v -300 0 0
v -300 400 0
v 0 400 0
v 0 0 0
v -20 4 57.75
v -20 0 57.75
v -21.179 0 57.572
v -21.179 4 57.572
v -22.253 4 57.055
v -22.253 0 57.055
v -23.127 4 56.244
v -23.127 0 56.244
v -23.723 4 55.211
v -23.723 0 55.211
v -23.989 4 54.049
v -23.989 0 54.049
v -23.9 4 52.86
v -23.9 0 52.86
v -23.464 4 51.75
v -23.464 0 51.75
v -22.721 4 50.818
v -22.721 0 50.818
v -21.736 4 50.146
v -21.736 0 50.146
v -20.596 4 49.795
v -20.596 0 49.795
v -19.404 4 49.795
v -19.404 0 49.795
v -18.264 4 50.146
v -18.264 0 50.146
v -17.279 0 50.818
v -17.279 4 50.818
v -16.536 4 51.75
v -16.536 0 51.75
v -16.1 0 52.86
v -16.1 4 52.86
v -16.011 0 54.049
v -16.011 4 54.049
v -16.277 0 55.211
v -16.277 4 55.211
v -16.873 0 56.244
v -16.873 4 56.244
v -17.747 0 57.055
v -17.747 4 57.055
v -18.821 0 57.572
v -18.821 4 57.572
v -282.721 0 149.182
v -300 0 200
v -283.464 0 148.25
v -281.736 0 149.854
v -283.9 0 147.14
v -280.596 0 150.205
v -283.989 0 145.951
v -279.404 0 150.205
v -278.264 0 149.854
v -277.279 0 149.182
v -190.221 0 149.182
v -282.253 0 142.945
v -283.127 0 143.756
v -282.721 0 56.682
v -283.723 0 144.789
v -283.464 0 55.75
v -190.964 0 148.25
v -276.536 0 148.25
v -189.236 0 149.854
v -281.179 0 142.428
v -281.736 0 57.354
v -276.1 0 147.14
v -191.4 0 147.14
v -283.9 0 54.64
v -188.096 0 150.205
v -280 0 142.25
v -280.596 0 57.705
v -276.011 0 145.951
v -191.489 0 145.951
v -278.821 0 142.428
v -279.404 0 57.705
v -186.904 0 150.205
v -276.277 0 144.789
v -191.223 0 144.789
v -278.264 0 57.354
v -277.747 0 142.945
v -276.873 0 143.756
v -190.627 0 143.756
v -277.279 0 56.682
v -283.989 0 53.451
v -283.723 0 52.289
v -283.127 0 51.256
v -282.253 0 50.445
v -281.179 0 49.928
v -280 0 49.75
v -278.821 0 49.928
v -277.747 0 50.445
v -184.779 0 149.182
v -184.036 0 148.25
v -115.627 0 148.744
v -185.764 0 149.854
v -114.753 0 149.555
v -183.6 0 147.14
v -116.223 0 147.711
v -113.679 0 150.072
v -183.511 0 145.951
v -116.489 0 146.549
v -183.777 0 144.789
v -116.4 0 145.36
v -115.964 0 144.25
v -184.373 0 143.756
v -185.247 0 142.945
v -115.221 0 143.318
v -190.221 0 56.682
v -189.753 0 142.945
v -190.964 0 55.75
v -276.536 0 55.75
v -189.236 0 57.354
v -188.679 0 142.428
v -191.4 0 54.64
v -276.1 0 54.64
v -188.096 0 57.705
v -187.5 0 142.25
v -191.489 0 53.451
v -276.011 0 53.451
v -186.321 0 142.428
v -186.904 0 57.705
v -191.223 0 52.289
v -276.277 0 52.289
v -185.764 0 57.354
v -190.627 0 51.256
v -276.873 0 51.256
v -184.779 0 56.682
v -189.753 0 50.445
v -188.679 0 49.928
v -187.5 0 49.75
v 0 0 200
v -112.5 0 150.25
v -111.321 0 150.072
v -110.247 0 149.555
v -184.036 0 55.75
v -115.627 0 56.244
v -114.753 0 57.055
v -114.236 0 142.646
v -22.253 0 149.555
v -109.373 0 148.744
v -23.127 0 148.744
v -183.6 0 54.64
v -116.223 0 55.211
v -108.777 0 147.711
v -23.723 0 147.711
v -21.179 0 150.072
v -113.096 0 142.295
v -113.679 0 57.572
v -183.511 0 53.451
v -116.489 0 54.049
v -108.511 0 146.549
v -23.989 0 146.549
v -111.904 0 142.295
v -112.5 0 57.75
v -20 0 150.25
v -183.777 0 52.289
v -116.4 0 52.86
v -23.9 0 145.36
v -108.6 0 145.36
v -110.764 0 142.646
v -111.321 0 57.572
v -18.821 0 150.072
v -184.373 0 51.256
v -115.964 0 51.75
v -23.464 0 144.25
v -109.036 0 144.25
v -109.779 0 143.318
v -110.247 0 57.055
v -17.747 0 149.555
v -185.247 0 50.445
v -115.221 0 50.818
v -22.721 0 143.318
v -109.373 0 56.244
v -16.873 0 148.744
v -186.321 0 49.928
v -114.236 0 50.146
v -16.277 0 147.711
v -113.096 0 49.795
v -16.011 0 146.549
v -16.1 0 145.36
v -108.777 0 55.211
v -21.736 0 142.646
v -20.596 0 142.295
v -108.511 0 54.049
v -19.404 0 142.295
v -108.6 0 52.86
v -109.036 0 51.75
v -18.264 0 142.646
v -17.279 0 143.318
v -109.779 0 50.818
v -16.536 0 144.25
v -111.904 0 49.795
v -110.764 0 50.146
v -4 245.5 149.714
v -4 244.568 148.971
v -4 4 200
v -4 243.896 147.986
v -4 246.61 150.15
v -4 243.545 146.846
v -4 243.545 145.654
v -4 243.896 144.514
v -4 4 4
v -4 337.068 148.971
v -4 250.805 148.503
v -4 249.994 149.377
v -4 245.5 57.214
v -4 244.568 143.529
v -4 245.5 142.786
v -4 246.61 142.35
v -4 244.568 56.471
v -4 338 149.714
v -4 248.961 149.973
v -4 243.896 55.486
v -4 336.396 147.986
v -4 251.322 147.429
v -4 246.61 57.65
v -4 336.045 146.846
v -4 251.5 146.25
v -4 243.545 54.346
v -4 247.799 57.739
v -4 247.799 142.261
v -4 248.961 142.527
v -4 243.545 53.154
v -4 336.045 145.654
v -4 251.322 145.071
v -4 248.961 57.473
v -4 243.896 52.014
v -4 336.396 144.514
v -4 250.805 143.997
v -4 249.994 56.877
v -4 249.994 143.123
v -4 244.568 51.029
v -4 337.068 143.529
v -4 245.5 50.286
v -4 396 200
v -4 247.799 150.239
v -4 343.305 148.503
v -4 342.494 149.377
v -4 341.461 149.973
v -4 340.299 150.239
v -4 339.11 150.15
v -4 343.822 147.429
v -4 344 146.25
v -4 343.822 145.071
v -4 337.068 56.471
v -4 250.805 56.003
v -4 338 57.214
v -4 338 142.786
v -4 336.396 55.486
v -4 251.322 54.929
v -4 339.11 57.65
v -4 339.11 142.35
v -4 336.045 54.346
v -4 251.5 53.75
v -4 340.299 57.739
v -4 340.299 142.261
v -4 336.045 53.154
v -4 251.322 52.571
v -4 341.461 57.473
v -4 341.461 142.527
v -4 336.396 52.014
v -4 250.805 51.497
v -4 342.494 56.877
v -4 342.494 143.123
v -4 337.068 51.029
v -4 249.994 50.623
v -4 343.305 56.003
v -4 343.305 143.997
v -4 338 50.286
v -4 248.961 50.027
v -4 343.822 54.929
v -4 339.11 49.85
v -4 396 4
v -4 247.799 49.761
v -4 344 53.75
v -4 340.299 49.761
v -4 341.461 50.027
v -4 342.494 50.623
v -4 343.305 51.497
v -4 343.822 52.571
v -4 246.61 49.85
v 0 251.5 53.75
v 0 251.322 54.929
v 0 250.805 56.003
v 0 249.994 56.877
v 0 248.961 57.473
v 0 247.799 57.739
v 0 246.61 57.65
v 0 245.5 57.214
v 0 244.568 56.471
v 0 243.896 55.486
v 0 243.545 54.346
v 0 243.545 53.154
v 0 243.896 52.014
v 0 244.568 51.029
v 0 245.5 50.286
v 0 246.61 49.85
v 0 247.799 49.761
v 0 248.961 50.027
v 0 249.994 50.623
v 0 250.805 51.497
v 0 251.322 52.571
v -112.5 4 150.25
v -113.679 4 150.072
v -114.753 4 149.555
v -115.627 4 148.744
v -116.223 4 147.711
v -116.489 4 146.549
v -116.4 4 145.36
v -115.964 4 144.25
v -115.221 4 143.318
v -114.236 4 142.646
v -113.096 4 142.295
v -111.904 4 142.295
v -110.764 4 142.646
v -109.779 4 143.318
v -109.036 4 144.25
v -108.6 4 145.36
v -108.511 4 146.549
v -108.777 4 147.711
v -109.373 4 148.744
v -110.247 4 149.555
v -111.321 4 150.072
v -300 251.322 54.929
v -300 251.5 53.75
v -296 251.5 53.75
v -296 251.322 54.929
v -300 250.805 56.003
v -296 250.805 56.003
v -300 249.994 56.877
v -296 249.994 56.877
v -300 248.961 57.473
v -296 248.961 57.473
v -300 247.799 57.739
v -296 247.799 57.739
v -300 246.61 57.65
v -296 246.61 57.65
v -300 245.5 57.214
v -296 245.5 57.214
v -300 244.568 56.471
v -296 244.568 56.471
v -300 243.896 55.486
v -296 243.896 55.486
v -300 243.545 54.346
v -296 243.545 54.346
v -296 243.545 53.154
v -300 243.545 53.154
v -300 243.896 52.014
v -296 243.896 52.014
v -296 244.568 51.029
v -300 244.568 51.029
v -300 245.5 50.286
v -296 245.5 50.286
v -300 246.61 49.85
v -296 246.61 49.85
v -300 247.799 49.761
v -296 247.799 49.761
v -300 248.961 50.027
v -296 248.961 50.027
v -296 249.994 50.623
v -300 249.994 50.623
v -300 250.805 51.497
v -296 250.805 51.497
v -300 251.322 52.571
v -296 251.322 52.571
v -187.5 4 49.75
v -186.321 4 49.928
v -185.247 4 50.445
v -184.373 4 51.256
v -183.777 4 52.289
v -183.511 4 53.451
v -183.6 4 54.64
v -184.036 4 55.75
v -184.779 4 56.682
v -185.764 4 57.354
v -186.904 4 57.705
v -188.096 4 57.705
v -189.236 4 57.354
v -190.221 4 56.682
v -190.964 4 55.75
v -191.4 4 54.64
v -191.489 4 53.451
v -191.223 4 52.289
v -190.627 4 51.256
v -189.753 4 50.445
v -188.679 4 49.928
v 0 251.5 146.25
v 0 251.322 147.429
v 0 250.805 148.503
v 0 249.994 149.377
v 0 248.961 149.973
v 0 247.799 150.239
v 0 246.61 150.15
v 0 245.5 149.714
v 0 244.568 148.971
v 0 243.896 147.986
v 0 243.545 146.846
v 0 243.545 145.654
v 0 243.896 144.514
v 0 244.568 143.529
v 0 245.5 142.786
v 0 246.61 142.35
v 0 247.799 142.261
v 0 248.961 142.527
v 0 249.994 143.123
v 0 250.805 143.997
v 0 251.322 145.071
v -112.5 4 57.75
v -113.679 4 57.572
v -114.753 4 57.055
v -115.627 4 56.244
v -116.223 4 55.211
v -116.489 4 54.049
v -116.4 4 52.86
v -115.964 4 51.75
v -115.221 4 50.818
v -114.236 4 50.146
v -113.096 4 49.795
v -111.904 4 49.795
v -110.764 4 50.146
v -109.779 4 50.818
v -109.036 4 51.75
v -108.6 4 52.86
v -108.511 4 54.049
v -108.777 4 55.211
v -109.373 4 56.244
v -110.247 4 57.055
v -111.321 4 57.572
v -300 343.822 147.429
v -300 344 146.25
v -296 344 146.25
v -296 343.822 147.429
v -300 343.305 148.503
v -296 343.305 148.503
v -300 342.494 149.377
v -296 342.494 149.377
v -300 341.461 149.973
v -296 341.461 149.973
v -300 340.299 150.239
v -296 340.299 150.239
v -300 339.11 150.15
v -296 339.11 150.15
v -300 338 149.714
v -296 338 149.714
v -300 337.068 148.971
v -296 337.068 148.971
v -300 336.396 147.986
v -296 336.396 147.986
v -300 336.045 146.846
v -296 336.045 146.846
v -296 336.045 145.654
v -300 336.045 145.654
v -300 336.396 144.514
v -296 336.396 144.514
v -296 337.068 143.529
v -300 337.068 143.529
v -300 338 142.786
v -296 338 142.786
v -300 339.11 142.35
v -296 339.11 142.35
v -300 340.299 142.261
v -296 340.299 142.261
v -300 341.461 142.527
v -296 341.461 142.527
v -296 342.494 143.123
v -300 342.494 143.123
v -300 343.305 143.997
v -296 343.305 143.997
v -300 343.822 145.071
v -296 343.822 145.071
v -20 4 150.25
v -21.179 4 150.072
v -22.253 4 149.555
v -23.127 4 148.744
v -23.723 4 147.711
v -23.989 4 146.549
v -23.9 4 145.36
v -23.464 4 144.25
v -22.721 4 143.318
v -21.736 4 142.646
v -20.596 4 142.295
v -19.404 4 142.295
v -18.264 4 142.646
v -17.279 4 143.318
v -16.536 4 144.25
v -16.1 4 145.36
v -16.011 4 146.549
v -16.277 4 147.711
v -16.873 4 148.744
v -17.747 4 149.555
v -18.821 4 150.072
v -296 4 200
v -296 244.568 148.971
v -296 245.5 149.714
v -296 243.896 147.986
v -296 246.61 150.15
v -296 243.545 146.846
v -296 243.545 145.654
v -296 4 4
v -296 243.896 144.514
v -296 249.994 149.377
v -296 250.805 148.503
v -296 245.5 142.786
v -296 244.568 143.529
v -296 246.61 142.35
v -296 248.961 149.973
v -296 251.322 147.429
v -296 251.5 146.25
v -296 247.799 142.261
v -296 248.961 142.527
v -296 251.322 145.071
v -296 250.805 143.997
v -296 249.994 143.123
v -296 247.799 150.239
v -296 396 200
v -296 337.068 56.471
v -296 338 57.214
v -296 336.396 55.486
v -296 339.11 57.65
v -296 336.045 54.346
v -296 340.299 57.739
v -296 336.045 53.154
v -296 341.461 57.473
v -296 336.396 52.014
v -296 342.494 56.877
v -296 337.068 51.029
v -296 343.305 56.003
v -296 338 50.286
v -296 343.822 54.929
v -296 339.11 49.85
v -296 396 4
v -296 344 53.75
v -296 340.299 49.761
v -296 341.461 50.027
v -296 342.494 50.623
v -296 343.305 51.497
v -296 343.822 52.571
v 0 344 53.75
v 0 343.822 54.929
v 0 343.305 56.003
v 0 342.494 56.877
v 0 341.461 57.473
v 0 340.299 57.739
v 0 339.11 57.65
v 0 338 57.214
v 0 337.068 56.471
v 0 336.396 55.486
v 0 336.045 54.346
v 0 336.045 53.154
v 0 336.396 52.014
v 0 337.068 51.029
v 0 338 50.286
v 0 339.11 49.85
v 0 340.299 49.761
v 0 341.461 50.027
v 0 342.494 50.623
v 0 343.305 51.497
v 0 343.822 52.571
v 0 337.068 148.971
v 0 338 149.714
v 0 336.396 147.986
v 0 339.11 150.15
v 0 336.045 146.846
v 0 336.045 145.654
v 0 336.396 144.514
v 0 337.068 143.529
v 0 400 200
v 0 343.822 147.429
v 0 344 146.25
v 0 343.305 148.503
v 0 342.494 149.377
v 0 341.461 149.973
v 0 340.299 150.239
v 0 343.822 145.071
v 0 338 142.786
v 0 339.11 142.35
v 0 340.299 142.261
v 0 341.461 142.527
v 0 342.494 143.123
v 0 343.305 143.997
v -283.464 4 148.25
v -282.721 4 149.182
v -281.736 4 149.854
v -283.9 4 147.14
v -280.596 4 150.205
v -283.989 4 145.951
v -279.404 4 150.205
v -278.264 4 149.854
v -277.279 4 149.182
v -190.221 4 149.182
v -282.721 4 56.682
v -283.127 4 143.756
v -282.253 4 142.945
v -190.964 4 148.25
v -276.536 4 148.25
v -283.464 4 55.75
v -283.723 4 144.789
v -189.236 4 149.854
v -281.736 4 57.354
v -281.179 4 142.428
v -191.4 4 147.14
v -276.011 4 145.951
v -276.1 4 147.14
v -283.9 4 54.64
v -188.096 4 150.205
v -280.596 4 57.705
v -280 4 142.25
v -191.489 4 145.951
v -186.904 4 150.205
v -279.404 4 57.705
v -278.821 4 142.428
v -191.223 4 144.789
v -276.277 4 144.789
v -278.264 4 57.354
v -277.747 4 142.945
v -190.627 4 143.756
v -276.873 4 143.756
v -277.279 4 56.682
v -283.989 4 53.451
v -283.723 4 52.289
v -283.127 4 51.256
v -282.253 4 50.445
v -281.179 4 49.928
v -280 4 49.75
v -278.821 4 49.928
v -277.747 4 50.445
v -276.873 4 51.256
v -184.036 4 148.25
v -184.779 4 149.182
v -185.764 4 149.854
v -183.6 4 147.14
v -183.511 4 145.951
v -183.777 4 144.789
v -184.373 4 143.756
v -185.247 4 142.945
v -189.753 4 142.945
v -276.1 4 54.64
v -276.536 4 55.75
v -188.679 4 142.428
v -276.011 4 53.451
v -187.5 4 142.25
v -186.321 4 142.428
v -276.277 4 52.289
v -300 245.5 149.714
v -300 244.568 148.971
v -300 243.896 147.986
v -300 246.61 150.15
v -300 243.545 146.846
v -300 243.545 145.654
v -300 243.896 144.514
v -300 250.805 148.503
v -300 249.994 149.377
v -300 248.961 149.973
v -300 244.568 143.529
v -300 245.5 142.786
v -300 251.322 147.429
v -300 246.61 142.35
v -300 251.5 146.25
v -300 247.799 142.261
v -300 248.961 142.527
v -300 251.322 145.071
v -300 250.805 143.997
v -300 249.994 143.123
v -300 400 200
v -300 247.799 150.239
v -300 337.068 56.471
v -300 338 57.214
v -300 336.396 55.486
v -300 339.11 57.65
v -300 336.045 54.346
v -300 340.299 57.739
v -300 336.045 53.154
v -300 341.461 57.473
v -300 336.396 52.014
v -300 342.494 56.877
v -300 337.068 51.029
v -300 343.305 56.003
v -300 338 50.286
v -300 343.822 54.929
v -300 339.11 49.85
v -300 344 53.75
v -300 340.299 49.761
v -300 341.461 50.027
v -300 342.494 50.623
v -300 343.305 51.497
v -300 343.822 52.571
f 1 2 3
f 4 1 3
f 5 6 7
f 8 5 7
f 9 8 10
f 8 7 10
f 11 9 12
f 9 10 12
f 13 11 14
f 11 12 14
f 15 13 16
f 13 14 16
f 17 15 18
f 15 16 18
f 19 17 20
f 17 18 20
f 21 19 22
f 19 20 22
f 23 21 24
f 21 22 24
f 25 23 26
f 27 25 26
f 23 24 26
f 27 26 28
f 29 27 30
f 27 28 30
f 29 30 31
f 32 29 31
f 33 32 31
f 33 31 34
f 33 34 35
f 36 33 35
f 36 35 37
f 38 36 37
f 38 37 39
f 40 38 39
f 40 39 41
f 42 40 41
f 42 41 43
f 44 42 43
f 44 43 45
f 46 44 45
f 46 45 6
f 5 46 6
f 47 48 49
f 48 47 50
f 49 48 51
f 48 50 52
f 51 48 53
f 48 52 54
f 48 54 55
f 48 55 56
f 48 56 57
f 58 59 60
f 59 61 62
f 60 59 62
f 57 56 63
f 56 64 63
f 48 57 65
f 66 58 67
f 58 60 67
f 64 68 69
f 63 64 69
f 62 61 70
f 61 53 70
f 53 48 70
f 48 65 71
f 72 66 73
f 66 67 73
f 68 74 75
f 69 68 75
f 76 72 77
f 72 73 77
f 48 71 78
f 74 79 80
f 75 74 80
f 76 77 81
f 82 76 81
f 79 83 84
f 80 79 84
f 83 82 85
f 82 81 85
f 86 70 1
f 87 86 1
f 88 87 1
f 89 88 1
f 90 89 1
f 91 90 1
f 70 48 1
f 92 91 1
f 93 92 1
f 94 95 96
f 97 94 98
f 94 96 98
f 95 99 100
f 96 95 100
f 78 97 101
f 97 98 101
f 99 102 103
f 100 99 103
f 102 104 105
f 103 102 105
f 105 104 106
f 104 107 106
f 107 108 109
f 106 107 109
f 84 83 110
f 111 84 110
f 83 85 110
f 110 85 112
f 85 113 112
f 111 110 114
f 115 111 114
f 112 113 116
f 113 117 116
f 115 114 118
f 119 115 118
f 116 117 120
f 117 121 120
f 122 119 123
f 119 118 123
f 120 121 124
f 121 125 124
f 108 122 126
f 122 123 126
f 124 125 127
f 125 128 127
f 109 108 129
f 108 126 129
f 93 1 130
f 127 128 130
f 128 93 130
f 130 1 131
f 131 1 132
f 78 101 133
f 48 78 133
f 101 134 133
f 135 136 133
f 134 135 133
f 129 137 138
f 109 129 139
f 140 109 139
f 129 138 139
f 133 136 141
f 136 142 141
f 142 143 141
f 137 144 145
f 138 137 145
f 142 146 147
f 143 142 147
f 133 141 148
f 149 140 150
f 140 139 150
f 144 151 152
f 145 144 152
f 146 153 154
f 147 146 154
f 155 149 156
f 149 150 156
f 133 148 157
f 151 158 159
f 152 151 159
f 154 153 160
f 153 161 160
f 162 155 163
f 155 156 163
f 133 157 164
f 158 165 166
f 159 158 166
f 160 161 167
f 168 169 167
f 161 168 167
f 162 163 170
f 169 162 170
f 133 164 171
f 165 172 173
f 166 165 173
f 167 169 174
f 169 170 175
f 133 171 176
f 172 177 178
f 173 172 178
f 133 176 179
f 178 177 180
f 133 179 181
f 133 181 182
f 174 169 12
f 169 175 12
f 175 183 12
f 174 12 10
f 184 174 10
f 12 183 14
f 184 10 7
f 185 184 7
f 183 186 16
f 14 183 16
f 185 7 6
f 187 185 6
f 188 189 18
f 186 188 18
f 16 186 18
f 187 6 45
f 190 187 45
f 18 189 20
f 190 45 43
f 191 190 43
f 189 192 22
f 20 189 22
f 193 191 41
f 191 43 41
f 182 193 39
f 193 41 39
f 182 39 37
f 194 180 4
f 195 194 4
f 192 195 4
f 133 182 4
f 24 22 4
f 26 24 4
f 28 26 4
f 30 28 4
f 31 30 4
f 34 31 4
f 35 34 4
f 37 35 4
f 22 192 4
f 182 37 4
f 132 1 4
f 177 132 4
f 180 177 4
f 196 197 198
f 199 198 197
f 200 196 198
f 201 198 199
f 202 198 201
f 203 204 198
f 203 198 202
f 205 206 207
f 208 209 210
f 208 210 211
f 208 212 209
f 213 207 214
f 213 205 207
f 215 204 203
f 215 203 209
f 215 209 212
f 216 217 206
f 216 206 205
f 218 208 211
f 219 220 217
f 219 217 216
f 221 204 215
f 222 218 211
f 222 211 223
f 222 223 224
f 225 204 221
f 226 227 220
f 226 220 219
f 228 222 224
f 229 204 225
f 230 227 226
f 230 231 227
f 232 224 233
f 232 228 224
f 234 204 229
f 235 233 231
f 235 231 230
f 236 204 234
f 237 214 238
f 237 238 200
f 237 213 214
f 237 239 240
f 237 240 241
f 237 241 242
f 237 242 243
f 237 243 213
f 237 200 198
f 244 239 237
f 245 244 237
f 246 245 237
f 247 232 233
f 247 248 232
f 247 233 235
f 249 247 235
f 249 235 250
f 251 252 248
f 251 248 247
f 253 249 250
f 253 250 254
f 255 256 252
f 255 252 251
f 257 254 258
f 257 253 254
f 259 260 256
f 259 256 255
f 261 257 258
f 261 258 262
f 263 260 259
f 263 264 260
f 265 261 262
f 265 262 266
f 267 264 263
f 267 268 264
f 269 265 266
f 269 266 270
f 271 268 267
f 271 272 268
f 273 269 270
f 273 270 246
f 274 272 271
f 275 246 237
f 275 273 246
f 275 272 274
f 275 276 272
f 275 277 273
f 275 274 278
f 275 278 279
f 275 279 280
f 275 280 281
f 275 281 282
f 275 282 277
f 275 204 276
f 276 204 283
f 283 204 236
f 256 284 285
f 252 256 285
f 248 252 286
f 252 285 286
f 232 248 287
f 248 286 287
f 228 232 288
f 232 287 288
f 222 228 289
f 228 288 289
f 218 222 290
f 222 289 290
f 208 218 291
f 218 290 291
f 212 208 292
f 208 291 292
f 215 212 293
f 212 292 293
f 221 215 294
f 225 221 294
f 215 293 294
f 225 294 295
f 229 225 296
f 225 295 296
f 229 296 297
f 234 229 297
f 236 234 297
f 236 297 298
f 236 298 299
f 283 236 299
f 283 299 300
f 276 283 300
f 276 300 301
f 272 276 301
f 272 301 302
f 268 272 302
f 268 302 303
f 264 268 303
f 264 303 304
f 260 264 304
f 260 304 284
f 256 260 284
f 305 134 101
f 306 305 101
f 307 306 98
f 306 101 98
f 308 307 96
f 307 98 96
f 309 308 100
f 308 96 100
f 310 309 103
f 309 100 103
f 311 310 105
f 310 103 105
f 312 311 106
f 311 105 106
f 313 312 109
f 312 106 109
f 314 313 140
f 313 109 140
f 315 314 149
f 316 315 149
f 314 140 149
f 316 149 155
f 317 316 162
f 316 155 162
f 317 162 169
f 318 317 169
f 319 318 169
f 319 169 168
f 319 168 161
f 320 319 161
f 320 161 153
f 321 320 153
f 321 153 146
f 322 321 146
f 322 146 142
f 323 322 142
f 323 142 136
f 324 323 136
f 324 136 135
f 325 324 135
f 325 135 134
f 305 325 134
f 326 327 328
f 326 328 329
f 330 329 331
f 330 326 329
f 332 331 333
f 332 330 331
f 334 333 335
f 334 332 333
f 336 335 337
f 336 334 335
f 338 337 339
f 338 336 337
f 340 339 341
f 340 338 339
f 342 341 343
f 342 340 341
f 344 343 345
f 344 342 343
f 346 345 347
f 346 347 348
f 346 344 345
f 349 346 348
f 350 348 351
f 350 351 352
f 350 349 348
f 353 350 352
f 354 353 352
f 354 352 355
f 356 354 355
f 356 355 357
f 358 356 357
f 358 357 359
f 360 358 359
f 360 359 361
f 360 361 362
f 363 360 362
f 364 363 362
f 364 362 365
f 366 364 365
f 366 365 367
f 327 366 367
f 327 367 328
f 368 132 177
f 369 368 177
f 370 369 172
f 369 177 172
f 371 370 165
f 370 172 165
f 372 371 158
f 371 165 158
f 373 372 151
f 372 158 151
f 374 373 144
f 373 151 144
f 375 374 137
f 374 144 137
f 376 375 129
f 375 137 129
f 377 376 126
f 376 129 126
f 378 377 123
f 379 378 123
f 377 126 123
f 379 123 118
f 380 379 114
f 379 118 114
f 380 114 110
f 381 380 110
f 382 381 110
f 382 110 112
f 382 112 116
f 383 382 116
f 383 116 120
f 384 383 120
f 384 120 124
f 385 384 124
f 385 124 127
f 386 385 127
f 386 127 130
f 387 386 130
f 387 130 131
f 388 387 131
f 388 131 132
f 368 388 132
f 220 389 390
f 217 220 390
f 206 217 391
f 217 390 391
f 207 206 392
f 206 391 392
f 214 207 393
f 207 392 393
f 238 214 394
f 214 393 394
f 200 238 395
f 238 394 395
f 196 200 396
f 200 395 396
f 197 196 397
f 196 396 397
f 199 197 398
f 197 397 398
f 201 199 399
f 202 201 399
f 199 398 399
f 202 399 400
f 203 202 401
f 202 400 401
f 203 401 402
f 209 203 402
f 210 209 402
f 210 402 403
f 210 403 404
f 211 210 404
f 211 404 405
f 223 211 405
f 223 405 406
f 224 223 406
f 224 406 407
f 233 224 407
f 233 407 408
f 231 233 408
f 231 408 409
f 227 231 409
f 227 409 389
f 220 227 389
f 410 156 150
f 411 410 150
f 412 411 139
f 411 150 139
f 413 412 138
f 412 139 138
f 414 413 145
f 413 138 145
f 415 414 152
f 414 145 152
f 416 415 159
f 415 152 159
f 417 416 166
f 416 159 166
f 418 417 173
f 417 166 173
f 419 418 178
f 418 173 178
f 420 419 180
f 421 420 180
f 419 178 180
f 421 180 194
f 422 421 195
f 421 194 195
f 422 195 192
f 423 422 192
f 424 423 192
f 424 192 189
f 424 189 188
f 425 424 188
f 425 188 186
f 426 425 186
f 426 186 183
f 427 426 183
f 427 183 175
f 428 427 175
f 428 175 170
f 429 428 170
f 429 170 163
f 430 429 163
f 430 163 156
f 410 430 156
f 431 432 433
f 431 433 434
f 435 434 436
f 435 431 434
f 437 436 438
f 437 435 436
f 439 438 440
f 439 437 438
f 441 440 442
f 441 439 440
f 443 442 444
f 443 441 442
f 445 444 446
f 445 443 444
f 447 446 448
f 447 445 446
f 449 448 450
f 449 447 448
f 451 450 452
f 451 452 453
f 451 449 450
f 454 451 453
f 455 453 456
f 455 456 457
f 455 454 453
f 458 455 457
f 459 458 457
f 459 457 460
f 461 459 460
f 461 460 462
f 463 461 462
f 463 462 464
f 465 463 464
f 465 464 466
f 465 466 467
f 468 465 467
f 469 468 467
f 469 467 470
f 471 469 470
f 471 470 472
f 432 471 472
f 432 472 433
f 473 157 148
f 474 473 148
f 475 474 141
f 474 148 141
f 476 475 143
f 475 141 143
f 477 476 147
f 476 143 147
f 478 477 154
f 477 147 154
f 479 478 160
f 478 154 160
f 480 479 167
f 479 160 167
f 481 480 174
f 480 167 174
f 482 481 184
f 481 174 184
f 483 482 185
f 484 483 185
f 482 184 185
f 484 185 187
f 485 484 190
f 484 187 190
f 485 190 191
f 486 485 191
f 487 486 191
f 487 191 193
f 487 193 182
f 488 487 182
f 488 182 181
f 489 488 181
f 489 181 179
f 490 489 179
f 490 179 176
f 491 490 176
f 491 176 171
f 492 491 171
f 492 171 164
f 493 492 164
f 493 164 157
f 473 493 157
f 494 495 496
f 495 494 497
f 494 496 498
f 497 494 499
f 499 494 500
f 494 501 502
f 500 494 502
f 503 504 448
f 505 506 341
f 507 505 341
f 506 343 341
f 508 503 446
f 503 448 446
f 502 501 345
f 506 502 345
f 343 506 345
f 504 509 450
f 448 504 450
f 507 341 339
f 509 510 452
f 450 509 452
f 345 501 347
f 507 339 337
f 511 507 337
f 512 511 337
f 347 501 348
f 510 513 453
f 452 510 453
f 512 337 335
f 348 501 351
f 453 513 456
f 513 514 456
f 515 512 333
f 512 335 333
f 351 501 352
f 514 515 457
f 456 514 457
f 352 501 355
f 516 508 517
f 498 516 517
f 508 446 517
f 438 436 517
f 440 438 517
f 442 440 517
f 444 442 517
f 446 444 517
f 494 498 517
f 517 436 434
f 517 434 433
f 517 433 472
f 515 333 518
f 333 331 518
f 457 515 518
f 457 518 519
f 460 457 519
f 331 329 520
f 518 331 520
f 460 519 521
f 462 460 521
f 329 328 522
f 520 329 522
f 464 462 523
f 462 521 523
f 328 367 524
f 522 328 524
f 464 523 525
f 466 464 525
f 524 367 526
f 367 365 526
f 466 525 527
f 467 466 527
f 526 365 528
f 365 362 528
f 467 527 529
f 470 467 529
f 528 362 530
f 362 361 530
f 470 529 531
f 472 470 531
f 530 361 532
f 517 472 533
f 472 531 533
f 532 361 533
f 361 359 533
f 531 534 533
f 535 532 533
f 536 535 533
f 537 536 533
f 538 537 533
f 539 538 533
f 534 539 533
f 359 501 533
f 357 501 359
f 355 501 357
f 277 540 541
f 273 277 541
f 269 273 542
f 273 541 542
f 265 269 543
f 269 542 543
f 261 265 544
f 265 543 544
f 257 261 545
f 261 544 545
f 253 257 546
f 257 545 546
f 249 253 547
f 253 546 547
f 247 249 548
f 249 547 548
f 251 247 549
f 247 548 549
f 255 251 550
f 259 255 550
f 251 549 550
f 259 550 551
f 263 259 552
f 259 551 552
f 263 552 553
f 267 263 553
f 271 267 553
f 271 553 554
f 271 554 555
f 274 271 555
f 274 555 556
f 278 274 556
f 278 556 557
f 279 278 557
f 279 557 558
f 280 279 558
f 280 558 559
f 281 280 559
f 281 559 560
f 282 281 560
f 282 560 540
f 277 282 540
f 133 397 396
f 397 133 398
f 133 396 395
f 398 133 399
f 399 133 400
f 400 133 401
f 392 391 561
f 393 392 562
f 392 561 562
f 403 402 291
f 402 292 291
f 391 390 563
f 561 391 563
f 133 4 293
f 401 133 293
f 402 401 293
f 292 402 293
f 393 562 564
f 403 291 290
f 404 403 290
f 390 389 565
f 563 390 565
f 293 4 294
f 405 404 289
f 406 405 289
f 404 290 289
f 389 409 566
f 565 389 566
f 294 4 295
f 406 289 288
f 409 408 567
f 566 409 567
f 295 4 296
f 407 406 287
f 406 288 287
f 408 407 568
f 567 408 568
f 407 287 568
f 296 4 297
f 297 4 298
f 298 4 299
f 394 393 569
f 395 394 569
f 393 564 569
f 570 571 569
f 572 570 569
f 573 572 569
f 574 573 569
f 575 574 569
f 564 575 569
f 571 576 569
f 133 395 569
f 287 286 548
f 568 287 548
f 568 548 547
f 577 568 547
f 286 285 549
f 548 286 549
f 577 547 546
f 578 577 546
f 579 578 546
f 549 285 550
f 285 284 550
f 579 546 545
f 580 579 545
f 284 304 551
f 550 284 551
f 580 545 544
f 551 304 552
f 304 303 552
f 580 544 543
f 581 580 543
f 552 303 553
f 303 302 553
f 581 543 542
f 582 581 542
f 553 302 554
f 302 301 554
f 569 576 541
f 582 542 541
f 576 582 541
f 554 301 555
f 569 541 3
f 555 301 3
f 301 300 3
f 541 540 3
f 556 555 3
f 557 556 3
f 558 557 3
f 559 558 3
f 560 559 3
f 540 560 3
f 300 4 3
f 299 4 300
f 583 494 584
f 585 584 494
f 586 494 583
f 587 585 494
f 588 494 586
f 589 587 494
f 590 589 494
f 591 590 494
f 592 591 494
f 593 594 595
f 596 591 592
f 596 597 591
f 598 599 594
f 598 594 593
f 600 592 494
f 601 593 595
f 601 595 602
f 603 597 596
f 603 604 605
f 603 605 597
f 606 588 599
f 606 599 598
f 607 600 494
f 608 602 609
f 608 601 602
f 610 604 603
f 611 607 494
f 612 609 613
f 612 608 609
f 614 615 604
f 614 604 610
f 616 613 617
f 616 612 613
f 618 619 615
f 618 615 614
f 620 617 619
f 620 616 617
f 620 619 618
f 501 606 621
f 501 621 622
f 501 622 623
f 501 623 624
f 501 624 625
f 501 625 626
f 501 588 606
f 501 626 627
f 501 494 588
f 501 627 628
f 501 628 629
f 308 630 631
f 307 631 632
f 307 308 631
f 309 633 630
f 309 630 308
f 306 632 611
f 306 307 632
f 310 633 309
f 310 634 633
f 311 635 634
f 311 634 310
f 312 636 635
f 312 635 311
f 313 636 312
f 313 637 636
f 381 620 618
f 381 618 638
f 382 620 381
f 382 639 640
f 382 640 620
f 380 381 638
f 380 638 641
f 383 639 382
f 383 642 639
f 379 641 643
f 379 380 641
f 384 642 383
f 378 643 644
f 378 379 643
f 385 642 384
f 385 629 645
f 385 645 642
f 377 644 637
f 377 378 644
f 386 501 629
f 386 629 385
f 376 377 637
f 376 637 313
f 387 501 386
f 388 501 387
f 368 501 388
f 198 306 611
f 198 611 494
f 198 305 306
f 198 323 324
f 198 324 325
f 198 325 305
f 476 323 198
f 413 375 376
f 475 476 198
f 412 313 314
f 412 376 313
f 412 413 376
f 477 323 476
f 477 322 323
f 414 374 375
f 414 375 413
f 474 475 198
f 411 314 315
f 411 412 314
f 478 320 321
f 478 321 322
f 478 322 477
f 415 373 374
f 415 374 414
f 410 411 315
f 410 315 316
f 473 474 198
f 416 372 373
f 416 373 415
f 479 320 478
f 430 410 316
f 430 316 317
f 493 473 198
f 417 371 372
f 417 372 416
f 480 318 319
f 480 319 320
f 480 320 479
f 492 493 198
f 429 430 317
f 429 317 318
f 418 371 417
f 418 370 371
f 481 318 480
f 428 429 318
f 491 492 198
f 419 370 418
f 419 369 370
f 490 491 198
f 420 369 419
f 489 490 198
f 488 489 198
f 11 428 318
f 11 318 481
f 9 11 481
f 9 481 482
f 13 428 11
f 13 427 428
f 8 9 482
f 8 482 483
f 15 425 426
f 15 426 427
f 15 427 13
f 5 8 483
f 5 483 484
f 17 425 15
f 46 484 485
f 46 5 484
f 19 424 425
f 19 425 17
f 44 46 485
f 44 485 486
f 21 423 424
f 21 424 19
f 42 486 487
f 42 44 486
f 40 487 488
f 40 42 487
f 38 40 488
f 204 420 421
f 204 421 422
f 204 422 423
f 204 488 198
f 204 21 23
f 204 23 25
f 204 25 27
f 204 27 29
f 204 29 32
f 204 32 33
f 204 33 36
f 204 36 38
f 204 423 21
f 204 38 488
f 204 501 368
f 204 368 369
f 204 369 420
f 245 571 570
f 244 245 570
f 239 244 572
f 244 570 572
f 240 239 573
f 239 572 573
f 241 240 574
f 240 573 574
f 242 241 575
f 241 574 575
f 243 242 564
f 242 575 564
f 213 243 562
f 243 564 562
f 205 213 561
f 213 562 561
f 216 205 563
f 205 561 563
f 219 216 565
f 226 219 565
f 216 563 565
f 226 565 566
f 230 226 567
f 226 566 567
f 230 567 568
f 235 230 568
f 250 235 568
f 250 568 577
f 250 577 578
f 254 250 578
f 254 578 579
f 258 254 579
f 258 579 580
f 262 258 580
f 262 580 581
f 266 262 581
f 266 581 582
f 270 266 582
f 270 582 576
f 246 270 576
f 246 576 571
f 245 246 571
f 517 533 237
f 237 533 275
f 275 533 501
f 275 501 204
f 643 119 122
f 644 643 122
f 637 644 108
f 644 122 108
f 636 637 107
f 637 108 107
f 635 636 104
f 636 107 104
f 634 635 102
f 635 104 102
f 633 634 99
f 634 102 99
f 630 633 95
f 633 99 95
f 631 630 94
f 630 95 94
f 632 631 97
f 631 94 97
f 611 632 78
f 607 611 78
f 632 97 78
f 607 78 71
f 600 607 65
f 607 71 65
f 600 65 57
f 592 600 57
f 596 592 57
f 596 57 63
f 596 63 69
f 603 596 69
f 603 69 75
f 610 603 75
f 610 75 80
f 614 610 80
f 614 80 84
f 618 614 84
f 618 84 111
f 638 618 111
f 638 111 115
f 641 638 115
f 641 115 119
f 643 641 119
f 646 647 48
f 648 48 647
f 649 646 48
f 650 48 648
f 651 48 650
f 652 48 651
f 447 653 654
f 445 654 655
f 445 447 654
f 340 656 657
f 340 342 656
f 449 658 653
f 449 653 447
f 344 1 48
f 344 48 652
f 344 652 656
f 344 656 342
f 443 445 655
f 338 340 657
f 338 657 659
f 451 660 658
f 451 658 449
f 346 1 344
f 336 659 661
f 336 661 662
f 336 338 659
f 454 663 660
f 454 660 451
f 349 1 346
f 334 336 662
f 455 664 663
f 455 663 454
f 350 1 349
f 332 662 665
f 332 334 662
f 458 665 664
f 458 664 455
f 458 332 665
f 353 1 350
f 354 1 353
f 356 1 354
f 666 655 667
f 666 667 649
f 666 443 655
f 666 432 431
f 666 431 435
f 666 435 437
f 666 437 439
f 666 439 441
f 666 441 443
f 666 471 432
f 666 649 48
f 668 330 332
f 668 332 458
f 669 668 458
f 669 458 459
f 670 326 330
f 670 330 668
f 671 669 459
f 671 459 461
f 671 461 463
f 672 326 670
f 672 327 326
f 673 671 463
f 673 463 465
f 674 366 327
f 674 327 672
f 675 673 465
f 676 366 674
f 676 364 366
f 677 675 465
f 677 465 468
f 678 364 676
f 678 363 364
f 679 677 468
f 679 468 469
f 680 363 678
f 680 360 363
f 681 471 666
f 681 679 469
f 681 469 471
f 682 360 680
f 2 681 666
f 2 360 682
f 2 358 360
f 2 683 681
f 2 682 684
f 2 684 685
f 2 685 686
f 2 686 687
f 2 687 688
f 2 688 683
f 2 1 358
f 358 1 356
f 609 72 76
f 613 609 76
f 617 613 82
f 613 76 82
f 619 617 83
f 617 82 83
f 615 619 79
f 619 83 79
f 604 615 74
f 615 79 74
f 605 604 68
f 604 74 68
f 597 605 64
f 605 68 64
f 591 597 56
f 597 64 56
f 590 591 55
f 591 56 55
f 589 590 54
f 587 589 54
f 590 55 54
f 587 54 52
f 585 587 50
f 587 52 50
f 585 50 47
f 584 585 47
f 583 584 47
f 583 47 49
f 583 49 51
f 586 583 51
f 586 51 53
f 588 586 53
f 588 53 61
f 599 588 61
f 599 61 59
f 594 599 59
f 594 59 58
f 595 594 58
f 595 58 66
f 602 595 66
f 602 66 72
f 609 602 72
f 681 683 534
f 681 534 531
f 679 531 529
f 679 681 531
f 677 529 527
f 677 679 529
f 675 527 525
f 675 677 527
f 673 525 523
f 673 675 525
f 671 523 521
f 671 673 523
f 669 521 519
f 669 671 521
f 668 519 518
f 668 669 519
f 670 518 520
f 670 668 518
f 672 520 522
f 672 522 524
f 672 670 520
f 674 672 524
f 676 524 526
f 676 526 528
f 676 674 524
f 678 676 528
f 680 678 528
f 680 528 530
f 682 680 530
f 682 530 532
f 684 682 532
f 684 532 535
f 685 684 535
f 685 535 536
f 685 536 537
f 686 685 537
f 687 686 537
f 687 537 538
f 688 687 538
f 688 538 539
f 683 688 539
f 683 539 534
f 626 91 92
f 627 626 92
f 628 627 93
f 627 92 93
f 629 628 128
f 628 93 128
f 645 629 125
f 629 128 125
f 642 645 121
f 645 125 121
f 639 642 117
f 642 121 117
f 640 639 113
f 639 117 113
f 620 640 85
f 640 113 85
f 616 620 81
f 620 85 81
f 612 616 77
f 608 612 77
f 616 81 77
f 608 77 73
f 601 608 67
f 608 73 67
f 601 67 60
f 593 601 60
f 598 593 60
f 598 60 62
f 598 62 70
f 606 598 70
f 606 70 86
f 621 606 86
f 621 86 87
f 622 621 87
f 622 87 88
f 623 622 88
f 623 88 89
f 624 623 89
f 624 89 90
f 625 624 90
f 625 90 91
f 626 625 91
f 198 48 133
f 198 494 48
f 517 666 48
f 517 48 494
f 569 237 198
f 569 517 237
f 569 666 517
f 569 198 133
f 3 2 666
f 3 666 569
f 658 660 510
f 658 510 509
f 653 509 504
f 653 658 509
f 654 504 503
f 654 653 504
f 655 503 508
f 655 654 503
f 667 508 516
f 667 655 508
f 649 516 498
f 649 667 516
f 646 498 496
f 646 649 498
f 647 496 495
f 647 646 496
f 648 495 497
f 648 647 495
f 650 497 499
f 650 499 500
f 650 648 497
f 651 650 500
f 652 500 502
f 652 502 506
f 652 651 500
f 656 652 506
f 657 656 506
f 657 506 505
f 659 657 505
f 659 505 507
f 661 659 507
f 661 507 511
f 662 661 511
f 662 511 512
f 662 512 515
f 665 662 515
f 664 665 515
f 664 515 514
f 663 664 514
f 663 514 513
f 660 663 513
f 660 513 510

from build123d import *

# Parameters (mm, degrees)
IZIM1_W                     = 300
IZIM1_H                     = 400
Y_KSEKLIK_EKSTR_ZYON1_DEPTH = 200
BO_ALTMA1_T                 = -4
KES_EKSTR_ZYON1_REACH       = 540.516
IZIM2_R                     = 4
KES_EKSTR_ZYON2_REACH       = 540.516
IZIM4_R                     = 4


with BuildPart() as part:
    # Çizim1 → Yükseklik-Ekstrüzyon1 (new body)
    with BuildSketch(Plane.XY):
        with Locations((-150, 200)):
            Rectangle(IZIM1_W, IZIM1_H)
    extrude(amount=Y_KSEKLIK_EKSTR_ZYON1_DEPTH)

    # İç Boşaltma1
    bo_altma1_openings = [part.faces().sort_by_distance(p)[0] for p in [
        (-150, 200, 200),
    ]]
    offset(amount=BO_ALTMA1_T, openings=bo_altma1_openings, kind=Kind.INTERSECTION)

    # Çizim2 → Kes-Ekstrüzyon1 (cut, up to next)
    with BuildSketch(Plane(origin=(0, 0, 0), x_dir=(0, 0, -1), z_dir=(1, 0, 0)), mode=Mode.PRIVATE) as kes_ekstr_zyon1_sk1:
        with Locations(Location((-146.25, 340, 0), (0, 0, 90))):
            Circle(IZIM2_R)
    kes_ekstr_zyon1_tool1 = extrude(kes_ekstr_zyon1_sk1.sketch, amount=-KES_EKSTR_ZYON1_REACH, mode=Mode.PRIVATE) & part.part
    # Çizim2 → Kes-Ekstrüzyon1 (cut, up to next)
    with BuildSketch(Plane(origin=(0, 0, 0), x_dir=(0, 0, -1), z_dir=(1, 0, 0)), mode=Mode.PRIVATE) as kes_ekstr_zyon1_sk2:
        with Locations(Location((-53.75, 340, 0), (0, 0, 90))):
            Circle(IZIM2_R)
    kes_ekstr_zyon1_tool2 = extrude(kes_ekstr_zyon1_sk2.sketch, amount=-KES_EKSTR_ZYON1_REACH, mode=Mode.PRIVATE) & part.part
    # Çizim2 → Kes-Ekstrüzyon1 (cut, up to next)
    with BuildSketch(Plane(origin=(0, 0, 0), x_dir=(0, 0, -1), z_dir=(1, 0, 0)), mode=Mode.PRIVATE) as kes_ekstr_zyon1_sk3:
        with Locations(Location((-146.25, 247.5, 0), (0, 0, 90))):
            Circle(IZIM2_R)
    kes_ekstr_zyon1_tool3 = extrude(kes_ekstr_zyon1_sk3.sketch, amount=-KES_EKSTR_ZYON1_REACH, mode=Mode.PRIVATE) & part.part
    # Çizim2 → Kes-Ekstrüzyon1 (cut, up to next)
    with BuildSketch(Plane(origin=(0, 0, 0), x_dir=(0, 0, -1), z_dir=(1, 0, 0)), mode=Mode.PRIVATE) as kes_ekstr_zyon1_sk4:
        with Locations(Location((-53.75, 247.5, 0), (0, 0, 90))):
            Circle(IZIM2_R)
    kes_ekstr_zyon1_tool4 = extrude(kes_ekstr_zyon1_sk4.sketch, amount=-KES_EKSTR_ZYON1_REACH, mode=Mode.PRIVATE) & part.part
    kes_ekstr_zyon1_1 = kes_ekstr_zyon1_tool1.solids().sort_by_distance((0, 340, 146.25))[0]
    add(kes_ekstr_zyon1_1, mode=Mode.SUBTRACT)
    kes_ekstr_zyon1_2 = kes_ekstr_zyon1_tool2.solids().sort_by_distance((0, 340, 53.75))[0]
    add(kes_ekstr_zyon1_2, mode=Mode.SUBTRACT)
    kes_ekstr_zyon1_3 = kes_ekstr_zyon1_tool3.solids().sort_by_distance((0, 247.5, 146.25))[0]
    add(kes_ekstr_zyon1_3, mode=Mode.SUBTRACT)
    kes_ekstr_zyon1_4 = kes_ekstr_zyon1_tool4.solids().sort_by_distance((0, 247.5, 53.75))[0]
    add(kes_ekstr_zyon1_4, mode=Mode.SUBTRACT)
    kes_ekstr_zyon1 = kes_ekstr_zyon1_1 + kes_ekstr_zyon1_2 + kes_ekstr_zyon1_3 + kes_ekstr_zyon1_4  # Kes-Ekstrüzyon1 as one shape, for the pattern or mirror that repeats it

    # Aynalama1: Kes-Ekstrüzyon1 across plane
    add(kes_ekstr_zyon1.mirror(Plane(origin=(-150, 0, 0), x_dir=(0, 0, 1), z_dir=(1, 0, 0))), mode=Mode.SUBTRACT)

    # Çizim4 → Kes-Ekstrüzyon2 (cut, up to next)
    with BuildSketch(Plane.XZ, mode=Mode.PRIVATE) as kes_ekstr_zyon2_sk1:
        with Locations(Location((-280, 146.25, 0), (0, 0, 270))):
            Circle(IZIM4_R)
    kes_ekstr_zyon2_tool1 = extrude(kes_ekstr_zyon2_sk1.sketch, amount=-KES_EKSTR_ZYON2_REACH, mode=Mode.PRIVATE) & part.part
    # Çizim4 → Kes-Ekstrüzyon2 (cut, up to next)
    with BuildSketch(Plane.XZ, mode=Mode.PRIVATE) as kes_ekstr_zyon2_sk2:
        with Locations(Location((-280, 53.75, 0), (0, 0, 270))):
            Circle(IZIM4_R)
    kes_ekstr_zyon2_tool2 = extrude(kes_ekstr_zyon2_sk2.sketch, amount=-KES_EKSTR_ZYON2_REACH, mode=Mode.PRIVATE) & part.part
    # Çizim4 → Kes-Ekstrüzyon2 (cut, up to next)
    with BuildSketch(Plane.XZ, mode=Mode.PRIVATE) as kes_ekstr_zyon2_sk3:
        with Locations(Location((-187.5, 146.25, 0), (0, 0, 270))):
            Circle(IZIM4_R)
    kes_ekstr_zyon2_tool3 = extrude(kes_ekstr_zyon2_sk3.sketch, amount=-KES_EKSTR_ZYON2_REACH, mode=Mode.PRIVATE) & part.part
    # Çizim4 → Kes-Ekstrüzyon2 (cut, up to next)
    with BuildSketch(Plane.XZ, mode=Mode.PRIVATE) as kes_ekstr_zyon2_sk4:
        with Locations(Location((-187.5, 53.75, 0), (0, 0, 270))):
            Circle(IZIM4_R)
    kes_ekstr_zyon2_tool4 = extrude(kes_ekstr_zyon2_sk4.sketch, amount=-KES_EKSTR_ZYON2_REACH, mode=Mode.PRIVATE) & part.part
    # Çizim4 → Kes-Ekstrüzyon2 (cut, up to next)
    with BuildSketch(Plane.XZ, mode=Mode.PRIVATE) as kes_ekstr_zyon2_sk5:
        with Locations(Location((-20, 146.25, 0), (0, 0, 90))):
            Circle(IZIM4_R)
    kes_ekstr_zyon2_tool5 = extrude(kes_ekstr_zyon2_sk5.sketch, amount=-KES_EKSTR_ZYON2_REACH, mode=Mode.PRIVATE) & part.part
    # Çizim4 → Kes-Ekstrüzyon2 (cut, up to next)
    with BuildSketch(Plane.XZ, mode=Mode.PRIVATE) as kes_ekstr_zyon2_sk6:
        with Locations(Location((-20, 53.75, 0), (0, 0, 90))):
            Circle(IZIM4_R)
    kes_ekstr_zyon2_tool6 = extrude(kes_ekstr_zyon2_sk6.sketch, amount=-KES_EKSTR_ZYON2_REACH, mode=Mode.PRIVATE) & part.part
    # Çizim4 → Kes-Ekstrüzyon2 (cut, up to next)
    with BuildSketch(Plane.XZ, mode=Mode.PRIVATE) as kes_ekstr_zyon2_sk7:
        with Locations(Location((-112.5, 53.75, 0), (0, 0, 90))):
            Circle(IZIM4_R)
    kes_ekstr_zyon2_tool7 = extrude(kes_ekstr_zyon2_sk7.sketch, amount=-KES_EKSTR_ZYON2_REACH, mode=Mode.PRIVATE) & part.part
    # Çizim4 → Kes-Ekstrüzyon2 (cut, up to next)
    with BuildSketch(Plane.XZ, mode=Mode.PRIVATE) as kes_ekstr_zyon2_sk8:
        with Locations(Location((-112.5, 146.25, 0), (0, 0, 90))):
            Circle(IZIM4_R)
    kes_ekstr_zyon2_tool8 = extrude(kes_ekstr_zyon2_sk8.sketch, amount=-KES_EKSTR_ZYON2_REACH, mode=Mode.PRIVATE) & part.part
    add(kes_ekstr_zyon2_tool1.solids().sort_by_distance((-280, 0, 146.25))[0], mode=Mode.SUBTRACT)
    add(kes_ekstr_zyon2_tool2.solids().sort_by_distance((-280, 0, 53.75))[0], mode=Mode.SUBTRACT)
    add(kes_ekstr_zyon2_tool3.solids().sort_by_distance((-187.5, 0, 146.25))[0], mode=Mode.SUBTRACT)
    add(kes_ekstr_zyon2_tool4.solids().sort_by_distance((-187.5, 0, 53.75))[0], mode=Mode.SUBTRACT)
    add(kes_ekstr_zyon2_tool5.solids().sort_by_distance((-20, 0, 146.25))[0], mode=Mode.SUBTRACT)
    add(kes_ekstr_zyon2_tool6.solids().sort_by_distance((-20, 0, 53.75))[0], mode=Mode.SUBTRACT)
    add(kes_ekstr_zyon2_tool7.solids().sort_by_distance((-112.5, 0, 53.75))[0], mode=Mode.SUBTRACT)
    add(kes_ekstr_zyon2_tool8.solids().sort_by_distance((-112.5, 0, 146.25))[0], mode=Mode.SUBTRACT)


solid = part.part
